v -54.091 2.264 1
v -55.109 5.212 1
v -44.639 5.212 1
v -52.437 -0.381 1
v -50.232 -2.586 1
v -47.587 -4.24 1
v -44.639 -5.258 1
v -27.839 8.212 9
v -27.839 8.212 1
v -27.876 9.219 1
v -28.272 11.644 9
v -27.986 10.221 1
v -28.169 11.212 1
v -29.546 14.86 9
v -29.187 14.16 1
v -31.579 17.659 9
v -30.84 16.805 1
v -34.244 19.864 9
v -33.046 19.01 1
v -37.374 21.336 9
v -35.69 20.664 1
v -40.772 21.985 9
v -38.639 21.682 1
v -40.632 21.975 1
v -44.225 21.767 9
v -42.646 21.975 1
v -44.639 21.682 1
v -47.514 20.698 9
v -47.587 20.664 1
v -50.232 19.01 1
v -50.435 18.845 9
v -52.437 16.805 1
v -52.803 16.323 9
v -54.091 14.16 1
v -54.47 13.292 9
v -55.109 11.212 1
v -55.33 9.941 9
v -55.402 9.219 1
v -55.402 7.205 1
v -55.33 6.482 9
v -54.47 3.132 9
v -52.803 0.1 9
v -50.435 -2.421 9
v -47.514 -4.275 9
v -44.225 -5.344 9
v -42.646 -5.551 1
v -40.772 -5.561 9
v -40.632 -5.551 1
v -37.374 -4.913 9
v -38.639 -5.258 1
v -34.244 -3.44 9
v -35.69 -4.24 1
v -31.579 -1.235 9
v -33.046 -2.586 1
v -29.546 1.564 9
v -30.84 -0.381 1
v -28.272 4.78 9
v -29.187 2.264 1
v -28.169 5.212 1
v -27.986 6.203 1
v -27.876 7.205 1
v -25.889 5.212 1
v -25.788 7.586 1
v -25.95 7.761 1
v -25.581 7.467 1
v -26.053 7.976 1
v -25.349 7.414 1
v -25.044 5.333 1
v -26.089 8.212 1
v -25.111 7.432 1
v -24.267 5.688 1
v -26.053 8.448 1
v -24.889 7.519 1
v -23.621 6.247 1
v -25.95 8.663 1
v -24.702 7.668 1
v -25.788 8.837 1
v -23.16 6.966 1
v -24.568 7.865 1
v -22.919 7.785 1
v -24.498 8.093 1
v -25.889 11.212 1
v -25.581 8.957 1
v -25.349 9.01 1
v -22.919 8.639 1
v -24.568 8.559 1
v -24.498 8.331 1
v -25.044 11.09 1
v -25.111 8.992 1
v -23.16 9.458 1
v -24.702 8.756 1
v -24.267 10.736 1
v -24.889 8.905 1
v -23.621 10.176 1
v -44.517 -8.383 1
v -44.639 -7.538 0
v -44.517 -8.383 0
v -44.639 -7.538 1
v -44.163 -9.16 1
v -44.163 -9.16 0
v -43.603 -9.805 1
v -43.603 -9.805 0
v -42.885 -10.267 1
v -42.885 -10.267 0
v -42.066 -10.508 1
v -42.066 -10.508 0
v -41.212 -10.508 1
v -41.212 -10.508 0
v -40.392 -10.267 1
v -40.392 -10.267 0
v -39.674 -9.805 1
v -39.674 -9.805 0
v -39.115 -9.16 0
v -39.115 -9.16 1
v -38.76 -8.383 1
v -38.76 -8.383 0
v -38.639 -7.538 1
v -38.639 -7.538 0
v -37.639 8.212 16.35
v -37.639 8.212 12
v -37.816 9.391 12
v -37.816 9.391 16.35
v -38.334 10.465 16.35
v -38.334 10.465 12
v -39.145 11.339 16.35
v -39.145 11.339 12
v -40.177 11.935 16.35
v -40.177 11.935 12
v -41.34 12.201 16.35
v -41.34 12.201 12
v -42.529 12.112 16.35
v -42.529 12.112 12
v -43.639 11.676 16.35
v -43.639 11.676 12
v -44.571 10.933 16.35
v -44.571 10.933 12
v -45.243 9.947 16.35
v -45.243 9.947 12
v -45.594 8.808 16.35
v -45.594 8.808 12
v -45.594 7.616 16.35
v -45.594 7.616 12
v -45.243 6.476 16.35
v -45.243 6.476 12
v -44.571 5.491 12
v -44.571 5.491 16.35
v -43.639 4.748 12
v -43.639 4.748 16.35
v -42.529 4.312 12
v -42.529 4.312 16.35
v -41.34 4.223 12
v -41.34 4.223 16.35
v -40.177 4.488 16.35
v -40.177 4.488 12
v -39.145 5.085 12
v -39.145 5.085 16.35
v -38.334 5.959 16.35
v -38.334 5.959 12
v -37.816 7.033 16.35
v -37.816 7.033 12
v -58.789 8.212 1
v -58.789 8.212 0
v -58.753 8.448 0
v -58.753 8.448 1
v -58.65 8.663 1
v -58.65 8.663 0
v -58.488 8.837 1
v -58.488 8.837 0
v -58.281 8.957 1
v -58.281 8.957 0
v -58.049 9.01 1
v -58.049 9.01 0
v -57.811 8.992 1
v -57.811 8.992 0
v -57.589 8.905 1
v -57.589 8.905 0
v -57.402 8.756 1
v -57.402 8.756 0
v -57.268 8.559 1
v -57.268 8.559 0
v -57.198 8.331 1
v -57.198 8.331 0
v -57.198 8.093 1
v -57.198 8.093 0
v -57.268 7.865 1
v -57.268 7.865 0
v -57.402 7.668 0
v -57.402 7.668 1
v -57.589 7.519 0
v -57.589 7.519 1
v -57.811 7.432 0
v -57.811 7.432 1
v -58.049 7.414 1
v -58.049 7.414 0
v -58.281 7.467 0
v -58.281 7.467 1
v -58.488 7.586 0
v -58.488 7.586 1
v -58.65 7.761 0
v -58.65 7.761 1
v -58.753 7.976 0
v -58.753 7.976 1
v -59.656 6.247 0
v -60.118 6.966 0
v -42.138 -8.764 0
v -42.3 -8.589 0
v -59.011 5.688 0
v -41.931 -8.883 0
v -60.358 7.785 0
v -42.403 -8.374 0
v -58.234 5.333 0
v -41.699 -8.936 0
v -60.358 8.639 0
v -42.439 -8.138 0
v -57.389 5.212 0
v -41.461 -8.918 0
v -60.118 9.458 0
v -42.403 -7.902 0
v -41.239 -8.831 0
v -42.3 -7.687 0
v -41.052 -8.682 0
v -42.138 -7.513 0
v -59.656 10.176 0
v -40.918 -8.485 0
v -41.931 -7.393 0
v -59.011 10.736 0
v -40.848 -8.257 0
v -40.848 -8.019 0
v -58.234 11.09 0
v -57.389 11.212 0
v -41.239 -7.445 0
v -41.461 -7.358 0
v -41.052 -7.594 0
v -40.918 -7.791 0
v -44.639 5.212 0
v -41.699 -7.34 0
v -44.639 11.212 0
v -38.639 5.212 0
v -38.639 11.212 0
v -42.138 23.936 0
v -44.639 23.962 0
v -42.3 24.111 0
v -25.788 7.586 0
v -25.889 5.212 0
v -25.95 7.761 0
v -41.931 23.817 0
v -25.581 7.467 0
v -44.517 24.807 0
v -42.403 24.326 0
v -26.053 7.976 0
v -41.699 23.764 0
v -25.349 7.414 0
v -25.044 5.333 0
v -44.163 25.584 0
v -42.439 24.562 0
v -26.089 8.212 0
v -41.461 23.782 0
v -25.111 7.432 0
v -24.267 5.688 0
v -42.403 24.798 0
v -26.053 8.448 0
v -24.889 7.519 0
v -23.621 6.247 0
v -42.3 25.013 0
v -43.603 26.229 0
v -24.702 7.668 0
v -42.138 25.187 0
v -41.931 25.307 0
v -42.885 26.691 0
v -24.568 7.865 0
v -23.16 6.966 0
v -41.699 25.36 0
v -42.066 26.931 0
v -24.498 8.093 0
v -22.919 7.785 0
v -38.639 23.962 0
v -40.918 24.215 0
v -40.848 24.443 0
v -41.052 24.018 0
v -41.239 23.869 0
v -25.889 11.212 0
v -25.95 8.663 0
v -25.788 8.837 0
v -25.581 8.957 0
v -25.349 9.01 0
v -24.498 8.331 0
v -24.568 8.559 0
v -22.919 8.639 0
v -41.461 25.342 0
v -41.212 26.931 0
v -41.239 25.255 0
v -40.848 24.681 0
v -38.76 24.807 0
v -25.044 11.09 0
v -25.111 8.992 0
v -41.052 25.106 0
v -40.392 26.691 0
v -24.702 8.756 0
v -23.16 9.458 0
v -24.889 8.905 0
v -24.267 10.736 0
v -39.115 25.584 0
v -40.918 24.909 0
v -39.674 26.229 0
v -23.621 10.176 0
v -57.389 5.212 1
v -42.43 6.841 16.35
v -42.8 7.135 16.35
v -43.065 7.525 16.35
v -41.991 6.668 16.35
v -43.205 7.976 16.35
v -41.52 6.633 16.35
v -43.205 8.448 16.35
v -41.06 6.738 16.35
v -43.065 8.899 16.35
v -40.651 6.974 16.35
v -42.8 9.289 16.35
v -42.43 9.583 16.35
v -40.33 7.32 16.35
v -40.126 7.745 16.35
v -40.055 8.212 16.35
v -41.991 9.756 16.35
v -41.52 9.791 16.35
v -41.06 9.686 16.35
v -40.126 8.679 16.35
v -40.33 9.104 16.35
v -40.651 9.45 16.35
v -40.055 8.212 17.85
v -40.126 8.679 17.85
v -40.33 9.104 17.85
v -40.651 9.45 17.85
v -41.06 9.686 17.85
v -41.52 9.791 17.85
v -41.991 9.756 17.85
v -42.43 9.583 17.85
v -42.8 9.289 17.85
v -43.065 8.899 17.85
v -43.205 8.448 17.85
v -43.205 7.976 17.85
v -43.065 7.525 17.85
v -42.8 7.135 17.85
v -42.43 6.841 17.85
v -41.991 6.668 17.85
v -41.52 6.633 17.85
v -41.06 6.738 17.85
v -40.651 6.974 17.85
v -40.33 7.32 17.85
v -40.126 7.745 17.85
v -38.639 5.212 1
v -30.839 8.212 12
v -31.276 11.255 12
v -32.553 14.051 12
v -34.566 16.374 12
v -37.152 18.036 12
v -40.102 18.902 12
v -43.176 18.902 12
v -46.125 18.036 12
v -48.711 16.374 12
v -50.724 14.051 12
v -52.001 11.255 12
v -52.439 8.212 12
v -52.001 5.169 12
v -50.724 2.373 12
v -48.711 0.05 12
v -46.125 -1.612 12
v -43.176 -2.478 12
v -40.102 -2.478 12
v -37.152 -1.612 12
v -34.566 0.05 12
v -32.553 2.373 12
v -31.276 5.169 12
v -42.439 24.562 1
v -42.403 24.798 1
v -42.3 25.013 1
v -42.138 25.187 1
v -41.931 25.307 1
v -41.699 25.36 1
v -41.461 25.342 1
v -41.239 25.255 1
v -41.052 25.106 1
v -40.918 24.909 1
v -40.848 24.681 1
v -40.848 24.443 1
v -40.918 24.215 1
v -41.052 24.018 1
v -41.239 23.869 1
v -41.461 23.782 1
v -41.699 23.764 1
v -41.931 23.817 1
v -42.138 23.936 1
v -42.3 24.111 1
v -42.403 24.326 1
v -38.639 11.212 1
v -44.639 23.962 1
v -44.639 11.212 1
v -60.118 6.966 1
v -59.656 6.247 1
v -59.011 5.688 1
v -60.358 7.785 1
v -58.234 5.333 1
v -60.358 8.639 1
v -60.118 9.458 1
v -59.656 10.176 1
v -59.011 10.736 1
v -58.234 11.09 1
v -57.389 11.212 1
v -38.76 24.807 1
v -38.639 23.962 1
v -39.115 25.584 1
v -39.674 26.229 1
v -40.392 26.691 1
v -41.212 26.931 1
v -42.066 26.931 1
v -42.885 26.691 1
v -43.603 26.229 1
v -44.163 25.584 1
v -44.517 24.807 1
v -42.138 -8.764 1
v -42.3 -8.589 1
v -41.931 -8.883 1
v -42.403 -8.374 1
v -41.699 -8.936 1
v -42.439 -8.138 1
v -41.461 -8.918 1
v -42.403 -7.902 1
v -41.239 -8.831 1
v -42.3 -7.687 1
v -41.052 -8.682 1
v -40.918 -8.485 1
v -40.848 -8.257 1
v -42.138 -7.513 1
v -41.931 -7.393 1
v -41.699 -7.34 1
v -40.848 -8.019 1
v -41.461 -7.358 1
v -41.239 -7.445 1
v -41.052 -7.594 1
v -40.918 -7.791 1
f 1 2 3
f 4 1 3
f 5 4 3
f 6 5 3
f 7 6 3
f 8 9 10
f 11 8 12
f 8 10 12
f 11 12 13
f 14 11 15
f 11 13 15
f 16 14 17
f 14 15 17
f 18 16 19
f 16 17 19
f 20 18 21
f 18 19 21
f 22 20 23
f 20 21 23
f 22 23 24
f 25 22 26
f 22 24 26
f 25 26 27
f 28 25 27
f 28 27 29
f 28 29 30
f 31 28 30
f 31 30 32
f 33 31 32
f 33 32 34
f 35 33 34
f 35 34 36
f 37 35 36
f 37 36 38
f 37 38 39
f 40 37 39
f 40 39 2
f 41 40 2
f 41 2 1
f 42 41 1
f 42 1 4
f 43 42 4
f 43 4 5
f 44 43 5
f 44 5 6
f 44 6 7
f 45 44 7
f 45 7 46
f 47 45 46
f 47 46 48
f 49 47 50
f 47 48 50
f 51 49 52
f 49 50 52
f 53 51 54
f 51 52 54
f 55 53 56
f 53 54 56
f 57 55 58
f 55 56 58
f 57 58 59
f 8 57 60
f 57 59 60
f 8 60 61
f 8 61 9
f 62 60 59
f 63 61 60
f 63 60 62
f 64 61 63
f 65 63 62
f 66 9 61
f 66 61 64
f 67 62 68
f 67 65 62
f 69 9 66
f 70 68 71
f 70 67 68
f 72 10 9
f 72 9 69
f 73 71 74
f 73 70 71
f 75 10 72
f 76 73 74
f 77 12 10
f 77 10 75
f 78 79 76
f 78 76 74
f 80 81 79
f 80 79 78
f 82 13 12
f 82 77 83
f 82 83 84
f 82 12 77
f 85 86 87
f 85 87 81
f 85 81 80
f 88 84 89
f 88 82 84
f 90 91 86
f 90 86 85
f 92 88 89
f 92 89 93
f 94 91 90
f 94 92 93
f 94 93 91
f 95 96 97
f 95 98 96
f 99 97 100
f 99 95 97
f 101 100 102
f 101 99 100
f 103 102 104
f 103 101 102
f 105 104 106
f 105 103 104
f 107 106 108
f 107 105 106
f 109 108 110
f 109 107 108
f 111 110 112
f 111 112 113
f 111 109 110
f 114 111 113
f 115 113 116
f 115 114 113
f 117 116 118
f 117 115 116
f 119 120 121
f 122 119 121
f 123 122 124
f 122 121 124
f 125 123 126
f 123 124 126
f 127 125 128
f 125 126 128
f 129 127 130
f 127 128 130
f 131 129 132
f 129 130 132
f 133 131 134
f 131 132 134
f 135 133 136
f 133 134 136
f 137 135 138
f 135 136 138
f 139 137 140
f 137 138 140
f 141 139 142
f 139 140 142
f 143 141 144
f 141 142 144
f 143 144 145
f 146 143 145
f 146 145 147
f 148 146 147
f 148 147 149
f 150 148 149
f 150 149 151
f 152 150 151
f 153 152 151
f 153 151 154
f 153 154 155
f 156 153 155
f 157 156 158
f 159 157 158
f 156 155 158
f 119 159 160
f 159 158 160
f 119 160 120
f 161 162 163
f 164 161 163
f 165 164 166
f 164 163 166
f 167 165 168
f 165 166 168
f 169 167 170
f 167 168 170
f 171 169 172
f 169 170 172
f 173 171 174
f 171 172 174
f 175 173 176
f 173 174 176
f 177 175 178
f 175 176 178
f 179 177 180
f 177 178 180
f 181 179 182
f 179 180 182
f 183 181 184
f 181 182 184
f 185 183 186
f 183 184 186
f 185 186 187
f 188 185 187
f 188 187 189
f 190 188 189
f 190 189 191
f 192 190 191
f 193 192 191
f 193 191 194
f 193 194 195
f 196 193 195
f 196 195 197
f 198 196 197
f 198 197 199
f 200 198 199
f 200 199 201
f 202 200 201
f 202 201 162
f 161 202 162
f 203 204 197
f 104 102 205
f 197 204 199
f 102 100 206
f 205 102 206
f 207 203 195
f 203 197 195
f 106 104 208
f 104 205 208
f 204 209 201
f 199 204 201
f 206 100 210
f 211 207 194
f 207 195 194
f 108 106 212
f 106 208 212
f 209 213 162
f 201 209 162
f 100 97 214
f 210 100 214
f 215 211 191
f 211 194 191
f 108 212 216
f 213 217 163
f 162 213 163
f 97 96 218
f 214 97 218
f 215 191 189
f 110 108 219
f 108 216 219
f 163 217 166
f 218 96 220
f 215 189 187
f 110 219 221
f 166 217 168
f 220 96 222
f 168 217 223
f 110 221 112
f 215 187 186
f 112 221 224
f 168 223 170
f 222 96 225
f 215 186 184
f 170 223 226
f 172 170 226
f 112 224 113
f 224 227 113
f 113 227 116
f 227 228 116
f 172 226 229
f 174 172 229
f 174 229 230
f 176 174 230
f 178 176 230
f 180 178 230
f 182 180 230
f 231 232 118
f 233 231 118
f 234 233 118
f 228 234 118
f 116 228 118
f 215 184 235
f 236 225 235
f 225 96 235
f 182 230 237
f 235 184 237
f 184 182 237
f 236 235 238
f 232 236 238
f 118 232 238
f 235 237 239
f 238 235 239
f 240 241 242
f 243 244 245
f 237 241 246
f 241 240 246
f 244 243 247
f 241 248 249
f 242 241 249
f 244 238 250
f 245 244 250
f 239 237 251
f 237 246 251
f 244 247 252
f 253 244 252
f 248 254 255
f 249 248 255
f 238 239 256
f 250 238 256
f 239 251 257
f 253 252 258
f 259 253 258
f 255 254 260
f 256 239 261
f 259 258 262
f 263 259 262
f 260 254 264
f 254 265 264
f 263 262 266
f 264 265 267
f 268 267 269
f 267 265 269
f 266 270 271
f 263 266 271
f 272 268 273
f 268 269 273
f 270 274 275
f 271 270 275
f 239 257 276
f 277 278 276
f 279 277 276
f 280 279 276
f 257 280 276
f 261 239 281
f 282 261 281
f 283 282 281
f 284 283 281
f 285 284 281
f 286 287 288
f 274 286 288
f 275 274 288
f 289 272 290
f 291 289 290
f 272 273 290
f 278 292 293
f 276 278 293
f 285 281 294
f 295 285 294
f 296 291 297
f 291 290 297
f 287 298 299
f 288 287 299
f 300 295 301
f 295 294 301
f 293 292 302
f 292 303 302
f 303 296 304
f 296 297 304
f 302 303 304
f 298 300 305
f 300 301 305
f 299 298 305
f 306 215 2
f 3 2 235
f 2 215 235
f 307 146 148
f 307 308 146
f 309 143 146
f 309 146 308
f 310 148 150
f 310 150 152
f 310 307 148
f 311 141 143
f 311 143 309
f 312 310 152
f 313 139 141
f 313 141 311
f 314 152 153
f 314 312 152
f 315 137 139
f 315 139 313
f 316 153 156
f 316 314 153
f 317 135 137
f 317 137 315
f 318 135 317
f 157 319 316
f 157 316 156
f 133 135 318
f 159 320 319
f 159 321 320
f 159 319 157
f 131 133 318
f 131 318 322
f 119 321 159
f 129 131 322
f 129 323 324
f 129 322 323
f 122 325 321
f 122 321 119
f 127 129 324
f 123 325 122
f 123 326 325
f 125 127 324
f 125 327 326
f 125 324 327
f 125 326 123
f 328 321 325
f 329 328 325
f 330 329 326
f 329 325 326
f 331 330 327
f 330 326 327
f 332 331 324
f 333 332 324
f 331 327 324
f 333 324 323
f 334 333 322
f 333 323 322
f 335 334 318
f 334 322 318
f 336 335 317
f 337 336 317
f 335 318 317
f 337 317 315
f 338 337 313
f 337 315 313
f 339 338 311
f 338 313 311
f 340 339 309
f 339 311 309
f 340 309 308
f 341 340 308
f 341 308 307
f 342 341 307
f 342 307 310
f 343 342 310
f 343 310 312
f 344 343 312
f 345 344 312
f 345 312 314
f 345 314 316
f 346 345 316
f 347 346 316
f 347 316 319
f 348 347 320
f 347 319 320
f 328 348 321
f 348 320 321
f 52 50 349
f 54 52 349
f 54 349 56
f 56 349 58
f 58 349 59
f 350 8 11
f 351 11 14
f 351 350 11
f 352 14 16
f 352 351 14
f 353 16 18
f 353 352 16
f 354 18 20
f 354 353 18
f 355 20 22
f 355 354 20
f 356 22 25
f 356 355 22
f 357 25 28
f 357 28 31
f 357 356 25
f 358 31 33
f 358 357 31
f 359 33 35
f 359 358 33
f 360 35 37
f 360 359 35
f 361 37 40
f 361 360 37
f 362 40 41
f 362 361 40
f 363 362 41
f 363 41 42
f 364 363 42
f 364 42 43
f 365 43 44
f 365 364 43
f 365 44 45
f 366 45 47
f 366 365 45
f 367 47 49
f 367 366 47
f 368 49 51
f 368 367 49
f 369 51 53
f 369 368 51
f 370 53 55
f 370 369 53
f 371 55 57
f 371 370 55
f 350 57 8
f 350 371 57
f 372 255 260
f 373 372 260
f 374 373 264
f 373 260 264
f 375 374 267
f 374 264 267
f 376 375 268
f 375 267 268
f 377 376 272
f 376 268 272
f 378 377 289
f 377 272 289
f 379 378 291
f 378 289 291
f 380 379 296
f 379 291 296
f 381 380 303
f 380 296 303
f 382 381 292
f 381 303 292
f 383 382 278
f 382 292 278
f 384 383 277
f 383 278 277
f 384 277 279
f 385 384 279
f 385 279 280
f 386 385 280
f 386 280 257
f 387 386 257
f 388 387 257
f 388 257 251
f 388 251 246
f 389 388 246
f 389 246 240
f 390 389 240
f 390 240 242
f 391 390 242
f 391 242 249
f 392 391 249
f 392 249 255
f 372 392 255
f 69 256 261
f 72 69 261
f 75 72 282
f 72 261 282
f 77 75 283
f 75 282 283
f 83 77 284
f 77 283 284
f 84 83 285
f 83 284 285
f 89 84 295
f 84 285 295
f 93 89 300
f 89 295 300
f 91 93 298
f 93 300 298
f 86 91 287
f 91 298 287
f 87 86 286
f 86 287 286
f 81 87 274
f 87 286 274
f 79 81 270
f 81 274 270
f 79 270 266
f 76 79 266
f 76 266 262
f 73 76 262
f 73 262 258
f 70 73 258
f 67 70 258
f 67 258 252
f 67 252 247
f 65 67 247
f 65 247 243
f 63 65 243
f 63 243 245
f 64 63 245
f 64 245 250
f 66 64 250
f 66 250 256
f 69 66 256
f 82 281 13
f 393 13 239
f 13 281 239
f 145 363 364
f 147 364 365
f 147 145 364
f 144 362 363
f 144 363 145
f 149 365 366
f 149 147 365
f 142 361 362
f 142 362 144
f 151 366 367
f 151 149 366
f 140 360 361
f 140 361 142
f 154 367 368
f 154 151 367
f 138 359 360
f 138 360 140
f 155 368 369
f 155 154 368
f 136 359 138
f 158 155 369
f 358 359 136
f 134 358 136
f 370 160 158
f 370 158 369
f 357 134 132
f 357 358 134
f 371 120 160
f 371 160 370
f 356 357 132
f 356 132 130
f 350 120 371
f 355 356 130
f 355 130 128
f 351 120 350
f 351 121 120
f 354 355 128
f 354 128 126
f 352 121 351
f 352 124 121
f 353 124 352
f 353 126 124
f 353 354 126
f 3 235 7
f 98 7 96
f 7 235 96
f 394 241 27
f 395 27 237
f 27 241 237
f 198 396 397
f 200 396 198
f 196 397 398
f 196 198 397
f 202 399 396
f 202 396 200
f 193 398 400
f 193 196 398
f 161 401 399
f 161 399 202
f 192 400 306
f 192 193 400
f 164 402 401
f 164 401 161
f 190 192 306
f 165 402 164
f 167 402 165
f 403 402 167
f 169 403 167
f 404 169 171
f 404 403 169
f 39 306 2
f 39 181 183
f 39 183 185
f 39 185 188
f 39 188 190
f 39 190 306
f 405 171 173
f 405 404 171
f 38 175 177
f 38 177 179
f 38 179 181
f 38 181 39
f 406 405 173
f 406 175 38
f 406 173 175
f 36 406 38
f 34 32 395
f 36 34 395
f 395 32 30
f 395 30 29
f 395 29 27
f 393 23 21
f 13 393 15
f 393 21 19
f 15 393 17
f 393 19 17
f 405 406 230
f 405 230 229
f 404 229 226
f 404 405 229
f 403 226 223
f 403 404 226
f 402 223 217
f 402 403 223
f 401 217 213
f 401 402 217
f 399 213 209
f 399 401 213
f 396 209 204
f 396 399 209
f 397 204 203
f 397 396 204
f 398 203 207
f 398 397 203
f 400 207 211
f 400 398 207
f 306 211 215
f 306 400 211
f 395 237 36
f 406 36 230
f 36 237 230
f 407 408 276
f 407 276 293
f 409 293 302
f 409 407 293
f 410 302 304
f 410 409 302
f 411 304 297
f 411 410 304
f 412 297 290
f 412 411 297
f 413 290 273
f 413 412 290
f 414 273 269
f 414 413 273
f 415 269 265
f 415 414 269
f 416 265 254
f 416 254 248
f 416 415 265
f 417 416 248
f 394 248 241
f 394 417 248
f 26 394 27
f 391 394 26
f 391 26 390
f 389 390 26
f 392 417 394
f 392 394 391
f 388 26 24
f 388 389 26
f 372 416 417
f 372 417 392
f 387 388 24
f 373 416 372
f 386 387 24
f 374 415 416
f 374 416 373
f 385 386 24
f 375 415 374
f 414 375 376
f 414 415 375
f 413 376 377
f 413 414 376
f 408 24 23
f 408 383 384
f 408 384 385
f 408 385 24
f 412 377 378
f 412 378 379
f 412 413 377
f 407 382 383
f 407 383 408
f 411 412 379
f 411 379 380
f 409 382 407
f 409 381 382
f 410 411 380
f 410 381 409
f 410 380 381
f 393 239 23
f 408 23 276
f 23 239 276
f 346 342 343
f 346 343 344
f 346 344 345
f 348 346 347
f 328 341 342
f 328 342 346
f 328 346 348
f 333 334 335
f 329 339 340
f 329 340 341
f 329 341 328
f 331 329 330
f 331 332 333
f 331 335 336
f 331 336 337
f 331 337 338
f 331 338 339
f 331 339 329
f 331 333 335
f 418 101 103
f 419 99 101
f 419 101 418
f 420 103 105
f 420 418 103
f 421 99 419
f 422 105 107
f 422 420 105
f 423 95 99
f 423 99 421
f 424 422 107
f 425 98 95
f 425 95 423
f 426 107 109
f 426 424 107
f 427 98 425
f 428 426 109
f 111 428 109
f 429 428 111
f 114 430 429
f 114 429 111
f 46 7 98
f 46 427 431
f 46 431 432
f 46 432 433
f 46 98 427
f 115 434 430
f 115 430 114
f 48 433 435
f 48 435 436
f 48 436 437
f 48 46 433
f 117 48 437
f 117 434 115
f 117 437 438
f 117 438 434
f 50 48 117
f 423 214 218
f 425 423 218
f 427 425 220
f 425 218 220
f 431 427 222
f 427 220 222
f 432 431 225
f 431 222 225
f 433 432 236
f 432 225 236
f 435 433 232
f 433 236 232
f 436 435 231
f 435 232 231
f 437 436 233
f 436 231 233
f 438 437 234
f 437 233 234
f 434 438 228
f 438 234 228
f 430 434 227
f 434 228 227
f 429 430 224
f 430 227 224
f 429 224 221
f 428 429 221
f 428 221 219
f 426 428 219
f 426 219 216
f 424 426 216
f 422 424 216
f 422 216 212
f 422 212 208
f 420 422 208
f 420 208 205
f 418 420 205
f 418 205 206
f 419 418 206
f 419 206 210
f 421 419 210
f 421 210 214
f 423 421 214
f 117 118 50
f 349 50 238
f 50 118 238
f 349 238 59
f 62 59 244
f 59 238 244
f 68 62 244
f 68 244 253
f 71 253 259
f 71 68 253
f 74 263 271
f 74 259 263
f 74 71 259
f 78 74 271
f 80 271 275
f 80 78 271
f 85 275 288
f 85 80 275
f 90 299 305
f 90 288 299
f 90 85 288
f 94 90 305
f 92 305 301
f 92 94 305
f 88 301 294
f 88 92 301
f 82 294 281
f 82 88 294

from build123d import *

# Parameters (mm, degrees)
BOSS_EXTRU_2_DEPTH                            = 1
ESQUISSE4_R                                   = 3
BOSS_EXTRU_5_DEPTH                            = 1
TROU_POUR_TARAUDAGE_POUR_TROU_TARAUD_M2_D     = 1.6
TROU_POUR_TARAUDAGE_POUR_TROU_TARAUD_M2_DEPTH = 10
TROU_POUR_TARAUDAGE_POUR_TROU_TARAUD_M2_TIP   = 0.480688495
ESQUISSE8_R                                   = 13.8
BOSS_EXTRU_6_DEPTH                            = 11
CHANFREIN1_SIZE                               = 3
ESQUISSE13_R                                  = 4
BOSS_EXTRU_7_DEPTH                            = 4.35
ESQUISSE14_R                                  = 1.583459573
BOSS_EXTRU_8_DEPTH                            = 1.5


with BuildPart() as part:
    # Esquisse3 → Boss.-Extru.2 (new body)
    with BuildSketch(Plane.XY):
        Polygon((-44.638743765, 23.961876808), (-44.638743765, 11.211876808), (-57.388743765, 11.211876808), (-57.388743765, 5.211876808), (-44.638743765, 5.211876808), (-44.638743765, -7.538123192), (-38.638743765, -7.538123192), (-38.638743765, 5.211876808), (-25.888743765, 5.211876808), (-25.888743765, 11.211876808), (-38.638743765, 11.211876808), (-38.638743765, 23.961876808), align=None)
    extrude(amount=BOSS_EXTRU_2_DEPTH)

    # Esquisse4 → Boss.-Extru.5 (add)
    with BuildSketch(Plane.XY.offset(1)):
        with Locations((-41.638743765, 23.961876808)):
            Circle(ESQUISSE4_R)
        with Locations((-25.888743765, 8.211876808)):
            Circle(ESQUISSE4_R)
        with Locations((-41.638743765, -7.538123192)):
            Circle(ESQUISSE4_R)
        with Locations((-57.388743765, 8.211876808)):
            Circle(ESQUISSE4_R)
    extrude(amount=-BOSS_EXTRU_5_DEPTH)

    # Trou pour taraudage pour trou taraudé M2x0.41
    with Locations(Plane.XY.offset(1)):
        with Locations((-41.638743765, 24.561876808), (-25.288743765, 8.211876808), (-41.638743765, -8.138123192), (-57.988743765, 8.211876808)):
            Hole(TROU_POUR_TARAUDAGE_POUR_TROU_TARAUD_M2_D / 2, depth=TROU_POUR_TARAUDAGE_POUR_TROU_TARAUD_M2_DEPTH)
            with Locations((0, 0, -(TROU_POUR_TARAUDAGE_POUR_TROU_TARAUD_M2_DEPTH + TROU_POUR_TARAUDAGE_POUR_TROU_TARAUD_M2_TIP / 2))):  # 118° drill point
                Cone(0, TROU_POUR_TARAUDAGE_POUR_TROU_TARAUD_M2_D / 2, TROU_POUR_TARAUDAGE_POUR_TROU_TARAUD_M2_TIP, mode=Mode.SUBTRACT)

    # Esquisse8 → Boss.-Extru.6 (add)
    with BuildSketch(Plane.XY.offset(1)):
        with Locations((-41.638743765, 8.211876808)):
            Circle(ESQUISSE8_R)
    extrude(amount=BOSS_EXTRU_6_DEPTH)

    # Chanfrein1
    chanfrein1_edges = [part.edges().sort_by_distance(p)[0] for p in [
        (-55.438743765, 8.211876808, 12),
    ]]
    chamfer(chanfrein1_edges, length=CHANFREIN1_SIZE)

    # Esquisse13 → Boss.-Extru.7 (add)
    with BuildSketch(Plane.XY.offset(12)):
        with Locations((-41.638743765, 8.211876808)):
            Circle(ESQUISSE13_R)
    extrude(amount=BOSS_EXTRU_7_DEPTH)

    # Esquisse14 → Boss.-Extru.8 (add)
    with BuildSketch(Plane.XY.offset(16.35)):
        with Locations((-41.638743765, 8.211876808)):
            Circle(ESQUISSE14_R)
    extrude(amount=BOSS_EXTRU_8_DEPTH)


solid = part.part
